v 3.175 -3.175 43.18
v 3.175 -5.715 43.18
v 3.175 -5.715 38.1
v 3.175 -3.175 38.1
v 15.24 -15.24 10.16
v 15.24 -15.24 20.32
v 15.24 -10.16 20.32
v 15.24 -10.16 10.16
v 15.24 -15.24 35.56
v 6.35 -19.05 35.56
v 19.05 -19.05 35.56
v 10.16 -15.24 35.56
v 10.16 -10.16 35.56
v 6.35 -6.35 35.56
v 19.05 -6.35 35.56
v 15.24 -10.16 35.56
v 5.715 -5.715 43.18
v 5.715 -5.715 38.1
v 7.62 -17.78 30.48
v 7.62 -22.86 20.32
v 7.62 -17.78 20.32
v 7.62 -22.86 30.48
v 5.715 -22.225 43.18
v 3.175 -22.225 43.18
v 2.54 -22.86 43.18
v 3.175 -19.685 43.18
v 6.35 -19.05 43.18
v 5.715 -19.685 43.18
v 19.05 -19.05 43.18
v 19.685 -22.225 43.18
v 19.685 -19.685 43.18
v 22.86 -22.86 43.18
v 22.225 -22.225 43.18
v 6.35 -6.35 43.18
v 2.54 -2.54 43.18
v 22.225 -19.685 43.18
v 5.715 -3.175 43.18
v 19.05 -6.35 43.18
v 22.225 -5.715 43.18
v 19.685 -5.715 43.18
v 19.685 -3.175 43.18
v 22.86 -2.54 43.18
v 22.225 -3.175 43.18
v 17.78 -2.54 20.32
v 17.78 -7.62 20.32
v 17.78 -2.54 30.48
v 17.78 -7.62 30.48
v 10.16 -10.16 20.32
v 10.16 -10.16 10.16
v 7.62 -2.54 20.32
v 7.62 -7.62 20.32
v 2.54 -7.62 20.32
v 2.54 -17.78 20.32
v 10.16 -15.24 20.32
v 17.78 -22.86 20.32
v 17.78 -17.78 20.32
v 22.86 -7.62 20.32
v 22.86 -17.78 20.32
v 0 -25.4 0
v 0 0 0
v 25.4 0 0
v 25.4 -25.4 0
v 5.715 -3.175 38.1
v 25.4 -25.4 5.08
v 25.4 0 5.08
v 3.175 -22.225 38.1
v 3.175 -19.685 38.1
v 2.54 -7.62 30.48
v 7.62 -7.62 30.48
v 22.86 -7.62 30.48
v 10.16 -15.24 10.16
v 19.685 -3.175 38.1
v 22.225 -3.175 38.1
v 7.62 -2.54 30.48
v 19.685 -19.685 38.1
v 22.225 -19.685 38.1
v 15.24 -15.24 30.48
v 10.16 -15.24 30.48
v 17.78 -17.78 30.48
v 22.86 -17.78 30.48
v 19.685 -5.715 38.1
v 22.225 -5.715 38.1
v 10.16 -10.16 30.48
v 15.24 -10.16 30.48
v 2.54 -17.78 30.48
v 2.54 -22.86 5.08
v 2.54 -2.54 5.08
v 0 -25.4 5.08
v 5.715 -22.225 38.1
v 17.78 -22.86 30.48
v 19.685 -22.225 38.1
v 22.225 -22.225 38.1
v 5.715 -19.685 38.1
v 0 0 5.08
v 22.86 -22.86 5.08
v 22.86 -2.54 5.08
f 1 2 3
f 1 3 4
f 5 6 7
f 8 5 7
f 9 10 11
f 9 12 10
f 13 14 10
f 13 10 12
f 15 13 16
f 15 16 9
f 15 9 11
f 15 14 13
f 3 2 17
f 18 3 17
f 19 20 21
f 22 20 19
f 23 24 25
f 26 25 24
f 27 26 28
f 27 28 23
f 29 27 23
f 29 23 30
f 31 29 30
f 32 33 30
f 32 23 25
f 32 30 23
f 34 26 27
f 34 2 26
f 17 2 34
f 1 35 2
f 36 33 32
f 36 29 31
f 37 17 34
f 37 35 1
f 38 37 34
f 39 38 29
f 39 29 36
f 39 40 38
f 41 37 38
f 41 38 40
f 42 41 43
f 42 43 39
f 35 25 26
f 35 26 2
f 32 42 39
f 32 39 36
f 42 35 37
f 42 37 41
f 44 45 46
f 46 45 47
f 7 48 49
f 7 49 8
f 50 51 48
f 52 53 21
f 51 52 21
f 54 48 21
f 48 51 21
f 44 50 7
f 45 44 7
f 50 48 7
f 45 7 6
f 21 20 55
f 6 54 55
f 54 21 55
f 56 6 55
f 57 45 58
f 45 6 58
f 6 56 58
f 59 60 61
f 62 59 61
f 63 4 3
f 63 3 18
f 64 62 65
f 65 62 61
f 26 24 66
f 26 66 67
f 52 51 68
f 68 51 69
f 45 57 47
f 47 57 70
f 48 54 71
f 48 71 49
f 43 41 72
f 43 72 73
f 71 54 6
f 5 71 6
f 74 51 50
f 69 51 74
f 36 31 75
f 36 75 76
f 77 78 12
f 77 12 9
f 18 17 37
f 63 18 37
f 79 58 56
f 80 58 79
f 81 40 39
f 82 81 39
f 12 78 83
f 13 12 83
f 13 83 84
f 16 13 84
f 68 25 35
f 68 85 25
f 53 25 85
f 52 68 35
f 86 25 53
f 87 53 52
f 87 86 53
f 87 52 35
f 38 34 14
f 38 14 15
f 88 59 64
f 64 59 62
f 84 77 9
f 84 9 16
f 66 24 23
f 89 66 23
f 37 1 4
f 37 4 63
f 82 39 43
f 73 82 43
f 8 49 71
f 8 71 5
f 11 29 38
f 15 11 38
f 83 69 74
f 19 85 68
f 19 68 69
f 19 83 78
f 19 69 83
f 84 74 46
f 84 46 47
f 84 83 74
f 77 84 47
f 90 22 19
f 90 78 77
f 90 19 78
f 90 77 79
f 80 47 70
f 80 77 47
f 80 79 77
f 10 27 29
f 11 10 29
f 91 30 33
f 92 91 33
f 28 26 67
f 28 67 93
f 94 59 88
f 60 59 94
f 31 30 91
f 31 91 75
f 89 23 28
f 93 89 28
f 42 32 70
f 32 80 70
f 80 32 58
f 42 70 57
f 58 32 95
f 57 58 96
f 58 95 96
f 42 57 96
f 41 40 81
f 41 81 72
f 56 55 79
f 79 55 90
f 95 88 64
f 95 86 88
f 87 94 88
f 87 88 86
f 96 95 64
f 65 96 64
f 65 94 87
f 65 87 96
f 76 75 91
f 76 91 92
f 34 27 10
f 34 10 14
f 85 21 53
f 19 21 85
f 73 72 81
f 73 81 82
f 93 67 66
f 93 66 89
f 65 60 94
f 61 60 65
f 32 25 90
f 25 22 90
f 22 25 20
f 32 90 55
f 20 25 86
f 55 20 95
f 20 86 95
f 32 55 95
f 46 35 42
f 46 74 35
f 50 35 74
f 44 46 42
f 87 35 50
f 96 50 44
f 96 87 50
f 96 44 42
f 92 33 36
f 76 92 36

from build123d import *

# Parameters (mm, degrees)
F0_W      = 25.4
F0_H      = 25.4
F1_DEPTH  = 5.08
F2_W      = 20.32
F2_H      = 20.32
F3_DEPTH  = 38.1
F4_W      = 12.7
F4_H      = 12.7
F5_DEPTH  = 7.62
F6_W      = 10.16
F6_H      = 10.16
F7_DEPTH  = 25.4
F8_W      = 5.08
F8_H      = 5.08
F9_DEPTH  = 25.4
F10_W     = 10.16
F10_H     = 10.16
F11_DEPTH = 25.4
F12_W     = 2.54
F12_H     = 2.54
F13_DEPTH = 5.08


with BuildPart() as f1:
    # F0 (on Top) → F1 (new body)
    with BuildSketch(Plane.XY):
        with Locations((12.7, -12.7)):
            Rectangle(F0_W, F0_H)
    extrude(amount=F1_DEPTH)

    # F2 (on face) → F3 (join)
    with BuildSketch(Plane.XY.offset(5.08)):
        with Locations((12.7, -12.7)):
            Rectangle(F2_W, F2_H)
    extrude(amount=F3_DEPTH)

    # F4 (on face) → F5 (cut)
    with BuildSketch(Plane.XY.offset(43.18)):
        with Locations((12.7, -12.7)):
            Rectangle(F4_W, F4_H)
    extrude(amount=-F5_DEPTH, mode=Mode.SUBTRACT)

    # F6 (on face) → F7 (cut)
    with BuildSketch(Plane.YZ.offset(22.86)):
        with Locations((-12.7, 25.4)):
            Rectangle(F6_W, F6_H)
    extrude(amount=-F7_DEPTH, mode=Mode.SUBTRACT)

    # F8 (on face) → F9 (cut)
    with BuildSketch(Plane.XY.offset(35.56)):
        with Locations((12.7, -12.7)):
            Rectangle(F8_W, F8_H)
    extrude(amount=-F9_DEPTH, mode=Mode.SUBTRACT)

    # F10 (on face) → F11 (cut)
    with BuildSketch(Plane.XZ.offset(22.86)):
        with Locations((12.7, 25.4)):
            Rectangle(F10_W, F10_H)
    extrude(amount=-F11_DEPTH, mode=Mode.SUBTRACT)

    # F12 (on face) → F13 (cut)
    with BuildSketch(Plane.XY.offset(43.18)):
        with Locations((20.955, -4.445)):
            Rectangle(F12_W, F12_H)
        with Locations((4.445, -4.445)):
            Rectangle(F12_W, F12_H)
        with Locations((4.445, -20.955)):
            Rectangle(F12_W, F12_H)
        with Locations((20.955, -20.955)):
            Rectangle(F12_W, F12_H)
    extrude(amount=-F13_DEPTH, mode=Mode.SUBTRACT)


solid = f1.part
